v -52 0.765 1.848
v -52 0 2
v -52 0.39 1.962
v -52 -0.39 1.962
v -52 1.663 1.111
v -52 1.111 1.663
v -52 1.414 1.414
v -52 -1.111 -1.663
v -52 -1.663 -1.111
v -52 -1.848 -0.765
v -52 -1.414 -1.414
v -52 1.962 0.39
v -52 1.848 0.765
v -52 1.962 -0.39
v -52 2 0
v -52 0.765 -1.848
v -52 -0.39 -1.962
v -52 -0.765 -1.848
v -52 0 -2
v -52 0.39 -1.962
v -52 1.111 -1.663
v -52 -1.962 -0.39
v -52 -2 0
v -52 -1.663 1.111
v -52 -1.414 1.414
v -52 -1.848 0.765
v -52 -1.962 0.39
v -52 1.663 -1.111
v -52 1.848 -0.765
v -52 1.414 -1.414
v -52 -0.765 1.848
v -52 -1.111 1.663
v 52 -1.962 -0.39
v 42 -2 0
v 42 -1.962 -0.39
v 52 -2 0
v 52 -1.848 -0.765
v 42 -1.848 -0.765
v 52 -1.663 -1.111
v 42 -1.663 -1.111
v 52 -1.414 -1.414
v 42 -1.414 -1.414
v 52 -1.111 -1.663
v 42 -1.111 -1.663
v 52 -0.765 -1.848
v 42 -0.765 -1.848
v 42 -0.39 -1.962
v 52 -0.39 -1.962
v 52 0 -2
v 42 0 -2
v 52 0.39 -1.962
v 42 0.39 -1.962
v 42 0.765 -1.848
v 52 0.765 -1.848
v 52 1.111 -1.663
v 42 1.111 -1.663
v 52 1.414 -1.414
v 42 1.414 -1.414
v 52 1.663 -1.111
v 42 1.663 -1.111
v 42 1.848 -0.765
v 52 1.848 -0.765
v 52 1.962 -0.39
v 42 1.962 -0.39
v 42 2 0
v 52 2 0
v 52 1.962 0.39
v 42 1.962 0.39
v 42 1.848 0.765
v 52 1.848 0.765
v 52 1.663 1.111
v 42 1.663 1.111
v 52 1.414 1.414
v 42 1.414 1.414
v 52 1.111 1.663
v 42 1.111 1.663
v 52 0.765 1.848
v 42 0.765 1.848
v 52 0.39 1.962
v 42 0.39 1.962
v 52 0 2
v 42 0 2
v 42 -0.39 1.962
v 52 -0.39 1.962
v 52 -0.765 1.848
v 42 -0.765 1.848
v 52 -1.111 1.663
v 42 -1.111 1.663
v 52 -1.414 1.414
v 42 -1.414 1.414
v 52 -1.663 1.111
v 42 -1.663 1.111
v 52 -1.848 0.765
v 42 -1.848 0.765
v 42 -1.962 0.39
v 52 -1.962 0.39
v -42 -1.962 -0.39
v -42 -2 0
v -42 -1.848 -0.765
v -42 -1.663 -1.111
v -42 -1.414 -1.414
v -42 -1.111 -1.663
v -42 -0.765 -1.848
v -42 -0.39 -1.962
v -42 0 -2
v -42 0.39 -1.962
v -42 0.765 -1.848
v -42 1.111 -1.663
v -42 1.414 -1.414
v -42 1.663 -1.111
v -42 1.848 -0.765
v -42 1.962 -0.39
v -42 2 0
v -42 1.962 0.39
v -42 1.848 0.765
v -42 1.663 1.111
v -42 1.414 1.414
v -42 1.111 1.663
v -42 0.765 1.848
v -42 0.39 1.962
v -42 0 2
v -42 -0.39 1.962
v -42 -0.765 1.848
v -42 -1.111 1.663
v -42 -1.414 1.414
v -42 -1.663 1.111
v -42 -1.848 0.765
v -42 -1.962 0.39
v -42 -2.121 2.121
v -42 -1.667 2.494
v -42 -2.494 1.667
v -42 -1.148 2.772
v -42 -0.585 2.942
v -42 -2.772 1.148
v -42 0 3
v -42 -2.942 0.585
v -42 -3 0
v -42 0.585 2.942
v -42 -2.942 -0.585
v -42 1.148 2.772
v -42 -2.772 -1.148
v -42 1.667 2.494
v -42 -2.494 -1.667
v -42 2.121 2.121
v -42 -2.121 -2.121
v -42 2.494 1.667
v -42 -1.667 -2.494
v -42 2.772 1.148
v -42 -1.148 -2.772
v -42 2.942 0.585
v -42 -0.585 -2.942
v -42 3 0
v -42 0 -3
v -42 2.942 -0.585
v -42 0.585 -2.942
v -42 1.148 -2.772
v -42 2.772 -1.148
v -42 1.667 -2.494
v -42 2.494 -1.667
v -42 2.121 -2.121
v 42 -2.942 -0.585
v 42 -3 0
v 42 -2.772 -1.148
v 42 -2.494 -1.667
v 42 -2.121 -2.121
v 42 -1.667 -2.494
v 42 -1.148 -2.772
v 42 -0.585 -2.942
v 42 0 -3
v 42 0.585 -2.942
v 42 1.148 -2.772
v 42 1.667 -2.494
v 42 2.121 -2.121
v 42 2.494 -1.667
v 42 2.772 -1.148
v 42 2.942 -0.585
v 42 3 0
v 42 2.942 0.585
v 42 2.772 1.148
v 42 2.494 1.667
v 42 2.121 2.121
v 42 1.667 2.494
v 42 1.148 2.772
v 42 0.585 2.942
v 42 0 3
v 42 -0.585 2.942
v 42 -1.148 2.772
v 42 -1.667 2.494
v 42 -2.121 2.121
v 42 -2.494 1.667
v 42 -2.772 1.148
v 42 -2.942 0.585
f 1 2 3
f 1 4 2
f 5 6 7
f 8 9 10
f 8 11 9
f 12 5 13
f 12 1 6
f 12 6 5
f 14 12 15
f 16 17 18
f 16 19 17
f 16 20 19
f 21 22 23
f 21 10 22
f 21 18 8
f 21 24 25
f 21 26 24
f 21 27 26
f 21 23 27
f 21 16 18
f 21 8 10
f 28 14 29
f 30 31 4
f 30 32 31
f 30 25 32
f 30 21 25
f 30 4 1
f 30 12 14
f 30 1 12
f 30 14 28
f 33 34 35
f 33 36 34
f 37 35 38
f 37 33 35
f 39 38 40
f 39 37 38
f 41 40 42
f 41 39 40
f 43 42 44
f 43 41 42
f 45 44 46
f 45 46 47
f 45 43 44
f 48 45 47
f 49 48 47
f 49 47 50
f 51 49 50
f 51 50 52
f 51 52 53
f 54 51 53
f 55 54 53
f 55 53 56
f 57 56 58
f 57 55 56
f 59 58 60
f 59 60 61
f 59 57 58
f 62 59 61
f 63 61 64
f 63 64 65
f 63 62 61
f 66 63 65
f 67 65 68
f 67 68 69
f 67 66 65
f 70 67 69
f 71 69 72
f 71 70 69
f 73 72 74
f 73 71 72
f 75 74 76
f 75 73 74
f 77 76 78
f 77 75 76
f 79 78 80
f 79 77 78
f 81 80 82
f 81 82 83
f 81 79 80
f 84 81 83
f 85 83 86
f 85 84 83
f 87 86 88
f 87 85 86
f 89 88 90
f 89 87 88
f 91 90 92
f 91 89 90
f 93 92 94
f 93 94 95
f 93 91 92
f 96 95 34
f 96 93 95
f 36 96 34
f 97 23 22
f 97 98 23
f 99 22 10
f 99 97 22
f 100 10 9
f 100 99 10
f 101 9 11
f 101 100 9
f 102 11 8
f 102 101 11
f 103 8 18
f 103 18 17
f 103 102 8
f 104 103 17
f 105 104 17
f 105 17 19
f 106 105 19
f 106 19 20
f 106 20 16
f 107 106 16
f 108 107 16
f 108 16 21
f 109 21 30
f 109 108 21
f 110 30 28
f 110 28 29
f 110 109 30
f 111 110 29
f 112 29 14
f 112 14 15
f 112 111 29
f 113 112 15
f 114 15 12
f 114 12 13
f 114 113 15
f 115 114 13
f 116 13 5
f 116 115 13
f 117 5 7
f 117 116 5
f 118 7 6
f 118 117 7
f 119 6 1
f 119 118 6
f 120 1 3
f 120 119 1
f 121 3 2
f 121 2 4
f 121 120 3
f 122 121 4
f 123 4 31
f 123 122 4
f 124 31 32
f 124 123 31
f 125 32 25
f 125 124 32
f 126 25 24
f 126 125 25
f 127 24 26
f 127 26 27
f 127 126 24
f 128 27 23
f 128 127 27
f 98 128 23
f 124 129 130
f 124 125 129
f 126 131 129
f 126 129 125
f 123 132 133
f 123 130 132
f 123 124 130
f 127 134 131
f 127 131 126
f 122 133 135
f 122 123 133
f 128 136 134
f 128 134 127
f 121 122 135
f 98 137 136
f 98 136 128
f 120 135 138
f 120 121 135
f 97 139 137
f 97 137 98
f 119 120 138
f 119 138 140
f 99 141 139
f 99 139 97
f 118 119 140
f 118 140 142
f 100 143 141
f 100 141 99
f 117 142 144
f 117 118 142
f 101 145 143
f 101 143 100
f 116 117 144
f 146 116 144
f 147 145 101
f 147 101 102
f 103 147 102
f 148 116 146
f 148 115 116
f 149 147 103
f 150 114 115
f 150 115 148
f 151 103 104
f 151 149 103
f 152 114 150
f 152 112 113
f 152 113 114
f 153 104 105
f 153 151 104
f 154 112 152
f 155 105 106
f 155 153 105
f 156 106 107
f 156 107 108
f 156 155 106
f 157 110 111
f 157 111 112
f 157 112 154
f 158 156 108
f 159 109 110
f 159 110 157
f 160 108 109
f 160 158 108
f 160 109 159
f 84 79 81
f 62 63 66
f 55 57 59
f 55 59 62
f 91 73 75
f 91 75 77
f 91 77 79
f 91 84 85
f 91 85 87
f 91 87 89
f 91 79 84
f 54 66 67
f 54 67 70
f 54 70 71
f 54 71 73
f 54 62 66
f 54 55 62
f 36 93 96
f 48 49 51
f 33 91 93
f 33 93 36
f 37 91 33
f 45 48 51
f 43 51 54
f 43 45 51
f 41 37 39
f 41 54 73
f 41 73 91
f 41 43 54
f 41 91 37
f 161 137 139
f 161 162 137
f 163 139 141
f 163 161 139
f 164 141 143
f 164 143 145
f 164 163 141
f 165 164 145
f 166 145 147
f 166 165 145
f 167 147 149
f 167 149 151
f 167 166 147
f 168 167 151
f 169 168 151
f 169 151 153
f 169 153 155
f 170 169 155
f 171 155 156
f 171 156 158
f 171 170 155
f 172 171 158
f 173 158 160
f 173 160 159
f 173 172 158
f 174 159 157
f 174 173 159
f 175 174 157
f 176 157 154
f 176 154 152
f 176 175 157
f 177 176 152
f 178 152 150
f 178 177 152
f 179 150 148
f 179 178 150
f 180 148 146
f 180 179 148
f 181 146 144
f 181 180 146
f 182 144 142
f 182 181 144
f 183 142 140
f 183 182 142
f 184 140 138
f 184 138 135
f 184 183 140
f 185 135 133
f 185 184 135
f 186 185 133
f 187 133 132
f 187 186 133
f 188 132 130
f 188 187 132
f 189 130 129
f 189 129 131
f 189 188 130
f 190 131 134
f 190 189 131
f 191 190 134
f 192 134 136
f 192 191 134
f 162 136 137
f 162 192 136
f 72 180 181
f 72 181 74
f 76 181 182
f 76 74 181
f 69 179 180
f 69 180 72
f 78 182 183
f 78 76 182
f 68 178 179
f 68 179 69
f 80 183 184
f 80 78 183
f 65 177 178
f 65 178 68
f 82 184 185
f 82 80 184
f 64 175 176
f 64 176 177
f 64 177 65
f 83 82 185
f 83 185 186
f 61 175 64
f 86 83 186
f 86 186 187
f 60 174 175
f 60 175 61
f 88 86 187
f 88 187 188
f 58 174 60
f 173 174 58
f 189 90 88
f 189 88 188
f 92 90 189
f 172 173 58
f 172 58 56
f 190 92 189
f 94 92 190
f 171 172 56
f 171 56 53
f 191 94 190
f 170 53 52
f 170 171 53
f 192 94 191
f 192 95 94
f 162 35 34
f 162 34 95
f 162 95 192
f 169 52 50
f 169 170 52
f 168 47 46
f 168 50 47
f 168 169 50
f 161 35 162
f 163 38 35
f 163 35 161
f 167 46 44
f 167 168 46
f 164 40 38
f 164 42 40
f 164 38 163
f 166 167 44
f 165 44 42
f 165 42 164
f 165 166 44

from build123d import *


with BuildPart() as part:
    # Sketch1 → Revolve1 (revolve)
    with BuildSketch(Plane.XY, mode=Mode.PRIVATE) as revolve1_sk:
        Polygon((-52, 0), (-52, 2), (-42, 2), (-42, 3), (42, 3), (42, 2), (52, 2), (52, 0), align=None)
    revolve(revolve1_sk.sketch.rotate(Axis((-52, 0, 0), (1, 0, 0)), 180), axis=Axis((-52, 0, 0), (1, 0, 0)))  # turned: the seam where the file's is


solid = part.part
